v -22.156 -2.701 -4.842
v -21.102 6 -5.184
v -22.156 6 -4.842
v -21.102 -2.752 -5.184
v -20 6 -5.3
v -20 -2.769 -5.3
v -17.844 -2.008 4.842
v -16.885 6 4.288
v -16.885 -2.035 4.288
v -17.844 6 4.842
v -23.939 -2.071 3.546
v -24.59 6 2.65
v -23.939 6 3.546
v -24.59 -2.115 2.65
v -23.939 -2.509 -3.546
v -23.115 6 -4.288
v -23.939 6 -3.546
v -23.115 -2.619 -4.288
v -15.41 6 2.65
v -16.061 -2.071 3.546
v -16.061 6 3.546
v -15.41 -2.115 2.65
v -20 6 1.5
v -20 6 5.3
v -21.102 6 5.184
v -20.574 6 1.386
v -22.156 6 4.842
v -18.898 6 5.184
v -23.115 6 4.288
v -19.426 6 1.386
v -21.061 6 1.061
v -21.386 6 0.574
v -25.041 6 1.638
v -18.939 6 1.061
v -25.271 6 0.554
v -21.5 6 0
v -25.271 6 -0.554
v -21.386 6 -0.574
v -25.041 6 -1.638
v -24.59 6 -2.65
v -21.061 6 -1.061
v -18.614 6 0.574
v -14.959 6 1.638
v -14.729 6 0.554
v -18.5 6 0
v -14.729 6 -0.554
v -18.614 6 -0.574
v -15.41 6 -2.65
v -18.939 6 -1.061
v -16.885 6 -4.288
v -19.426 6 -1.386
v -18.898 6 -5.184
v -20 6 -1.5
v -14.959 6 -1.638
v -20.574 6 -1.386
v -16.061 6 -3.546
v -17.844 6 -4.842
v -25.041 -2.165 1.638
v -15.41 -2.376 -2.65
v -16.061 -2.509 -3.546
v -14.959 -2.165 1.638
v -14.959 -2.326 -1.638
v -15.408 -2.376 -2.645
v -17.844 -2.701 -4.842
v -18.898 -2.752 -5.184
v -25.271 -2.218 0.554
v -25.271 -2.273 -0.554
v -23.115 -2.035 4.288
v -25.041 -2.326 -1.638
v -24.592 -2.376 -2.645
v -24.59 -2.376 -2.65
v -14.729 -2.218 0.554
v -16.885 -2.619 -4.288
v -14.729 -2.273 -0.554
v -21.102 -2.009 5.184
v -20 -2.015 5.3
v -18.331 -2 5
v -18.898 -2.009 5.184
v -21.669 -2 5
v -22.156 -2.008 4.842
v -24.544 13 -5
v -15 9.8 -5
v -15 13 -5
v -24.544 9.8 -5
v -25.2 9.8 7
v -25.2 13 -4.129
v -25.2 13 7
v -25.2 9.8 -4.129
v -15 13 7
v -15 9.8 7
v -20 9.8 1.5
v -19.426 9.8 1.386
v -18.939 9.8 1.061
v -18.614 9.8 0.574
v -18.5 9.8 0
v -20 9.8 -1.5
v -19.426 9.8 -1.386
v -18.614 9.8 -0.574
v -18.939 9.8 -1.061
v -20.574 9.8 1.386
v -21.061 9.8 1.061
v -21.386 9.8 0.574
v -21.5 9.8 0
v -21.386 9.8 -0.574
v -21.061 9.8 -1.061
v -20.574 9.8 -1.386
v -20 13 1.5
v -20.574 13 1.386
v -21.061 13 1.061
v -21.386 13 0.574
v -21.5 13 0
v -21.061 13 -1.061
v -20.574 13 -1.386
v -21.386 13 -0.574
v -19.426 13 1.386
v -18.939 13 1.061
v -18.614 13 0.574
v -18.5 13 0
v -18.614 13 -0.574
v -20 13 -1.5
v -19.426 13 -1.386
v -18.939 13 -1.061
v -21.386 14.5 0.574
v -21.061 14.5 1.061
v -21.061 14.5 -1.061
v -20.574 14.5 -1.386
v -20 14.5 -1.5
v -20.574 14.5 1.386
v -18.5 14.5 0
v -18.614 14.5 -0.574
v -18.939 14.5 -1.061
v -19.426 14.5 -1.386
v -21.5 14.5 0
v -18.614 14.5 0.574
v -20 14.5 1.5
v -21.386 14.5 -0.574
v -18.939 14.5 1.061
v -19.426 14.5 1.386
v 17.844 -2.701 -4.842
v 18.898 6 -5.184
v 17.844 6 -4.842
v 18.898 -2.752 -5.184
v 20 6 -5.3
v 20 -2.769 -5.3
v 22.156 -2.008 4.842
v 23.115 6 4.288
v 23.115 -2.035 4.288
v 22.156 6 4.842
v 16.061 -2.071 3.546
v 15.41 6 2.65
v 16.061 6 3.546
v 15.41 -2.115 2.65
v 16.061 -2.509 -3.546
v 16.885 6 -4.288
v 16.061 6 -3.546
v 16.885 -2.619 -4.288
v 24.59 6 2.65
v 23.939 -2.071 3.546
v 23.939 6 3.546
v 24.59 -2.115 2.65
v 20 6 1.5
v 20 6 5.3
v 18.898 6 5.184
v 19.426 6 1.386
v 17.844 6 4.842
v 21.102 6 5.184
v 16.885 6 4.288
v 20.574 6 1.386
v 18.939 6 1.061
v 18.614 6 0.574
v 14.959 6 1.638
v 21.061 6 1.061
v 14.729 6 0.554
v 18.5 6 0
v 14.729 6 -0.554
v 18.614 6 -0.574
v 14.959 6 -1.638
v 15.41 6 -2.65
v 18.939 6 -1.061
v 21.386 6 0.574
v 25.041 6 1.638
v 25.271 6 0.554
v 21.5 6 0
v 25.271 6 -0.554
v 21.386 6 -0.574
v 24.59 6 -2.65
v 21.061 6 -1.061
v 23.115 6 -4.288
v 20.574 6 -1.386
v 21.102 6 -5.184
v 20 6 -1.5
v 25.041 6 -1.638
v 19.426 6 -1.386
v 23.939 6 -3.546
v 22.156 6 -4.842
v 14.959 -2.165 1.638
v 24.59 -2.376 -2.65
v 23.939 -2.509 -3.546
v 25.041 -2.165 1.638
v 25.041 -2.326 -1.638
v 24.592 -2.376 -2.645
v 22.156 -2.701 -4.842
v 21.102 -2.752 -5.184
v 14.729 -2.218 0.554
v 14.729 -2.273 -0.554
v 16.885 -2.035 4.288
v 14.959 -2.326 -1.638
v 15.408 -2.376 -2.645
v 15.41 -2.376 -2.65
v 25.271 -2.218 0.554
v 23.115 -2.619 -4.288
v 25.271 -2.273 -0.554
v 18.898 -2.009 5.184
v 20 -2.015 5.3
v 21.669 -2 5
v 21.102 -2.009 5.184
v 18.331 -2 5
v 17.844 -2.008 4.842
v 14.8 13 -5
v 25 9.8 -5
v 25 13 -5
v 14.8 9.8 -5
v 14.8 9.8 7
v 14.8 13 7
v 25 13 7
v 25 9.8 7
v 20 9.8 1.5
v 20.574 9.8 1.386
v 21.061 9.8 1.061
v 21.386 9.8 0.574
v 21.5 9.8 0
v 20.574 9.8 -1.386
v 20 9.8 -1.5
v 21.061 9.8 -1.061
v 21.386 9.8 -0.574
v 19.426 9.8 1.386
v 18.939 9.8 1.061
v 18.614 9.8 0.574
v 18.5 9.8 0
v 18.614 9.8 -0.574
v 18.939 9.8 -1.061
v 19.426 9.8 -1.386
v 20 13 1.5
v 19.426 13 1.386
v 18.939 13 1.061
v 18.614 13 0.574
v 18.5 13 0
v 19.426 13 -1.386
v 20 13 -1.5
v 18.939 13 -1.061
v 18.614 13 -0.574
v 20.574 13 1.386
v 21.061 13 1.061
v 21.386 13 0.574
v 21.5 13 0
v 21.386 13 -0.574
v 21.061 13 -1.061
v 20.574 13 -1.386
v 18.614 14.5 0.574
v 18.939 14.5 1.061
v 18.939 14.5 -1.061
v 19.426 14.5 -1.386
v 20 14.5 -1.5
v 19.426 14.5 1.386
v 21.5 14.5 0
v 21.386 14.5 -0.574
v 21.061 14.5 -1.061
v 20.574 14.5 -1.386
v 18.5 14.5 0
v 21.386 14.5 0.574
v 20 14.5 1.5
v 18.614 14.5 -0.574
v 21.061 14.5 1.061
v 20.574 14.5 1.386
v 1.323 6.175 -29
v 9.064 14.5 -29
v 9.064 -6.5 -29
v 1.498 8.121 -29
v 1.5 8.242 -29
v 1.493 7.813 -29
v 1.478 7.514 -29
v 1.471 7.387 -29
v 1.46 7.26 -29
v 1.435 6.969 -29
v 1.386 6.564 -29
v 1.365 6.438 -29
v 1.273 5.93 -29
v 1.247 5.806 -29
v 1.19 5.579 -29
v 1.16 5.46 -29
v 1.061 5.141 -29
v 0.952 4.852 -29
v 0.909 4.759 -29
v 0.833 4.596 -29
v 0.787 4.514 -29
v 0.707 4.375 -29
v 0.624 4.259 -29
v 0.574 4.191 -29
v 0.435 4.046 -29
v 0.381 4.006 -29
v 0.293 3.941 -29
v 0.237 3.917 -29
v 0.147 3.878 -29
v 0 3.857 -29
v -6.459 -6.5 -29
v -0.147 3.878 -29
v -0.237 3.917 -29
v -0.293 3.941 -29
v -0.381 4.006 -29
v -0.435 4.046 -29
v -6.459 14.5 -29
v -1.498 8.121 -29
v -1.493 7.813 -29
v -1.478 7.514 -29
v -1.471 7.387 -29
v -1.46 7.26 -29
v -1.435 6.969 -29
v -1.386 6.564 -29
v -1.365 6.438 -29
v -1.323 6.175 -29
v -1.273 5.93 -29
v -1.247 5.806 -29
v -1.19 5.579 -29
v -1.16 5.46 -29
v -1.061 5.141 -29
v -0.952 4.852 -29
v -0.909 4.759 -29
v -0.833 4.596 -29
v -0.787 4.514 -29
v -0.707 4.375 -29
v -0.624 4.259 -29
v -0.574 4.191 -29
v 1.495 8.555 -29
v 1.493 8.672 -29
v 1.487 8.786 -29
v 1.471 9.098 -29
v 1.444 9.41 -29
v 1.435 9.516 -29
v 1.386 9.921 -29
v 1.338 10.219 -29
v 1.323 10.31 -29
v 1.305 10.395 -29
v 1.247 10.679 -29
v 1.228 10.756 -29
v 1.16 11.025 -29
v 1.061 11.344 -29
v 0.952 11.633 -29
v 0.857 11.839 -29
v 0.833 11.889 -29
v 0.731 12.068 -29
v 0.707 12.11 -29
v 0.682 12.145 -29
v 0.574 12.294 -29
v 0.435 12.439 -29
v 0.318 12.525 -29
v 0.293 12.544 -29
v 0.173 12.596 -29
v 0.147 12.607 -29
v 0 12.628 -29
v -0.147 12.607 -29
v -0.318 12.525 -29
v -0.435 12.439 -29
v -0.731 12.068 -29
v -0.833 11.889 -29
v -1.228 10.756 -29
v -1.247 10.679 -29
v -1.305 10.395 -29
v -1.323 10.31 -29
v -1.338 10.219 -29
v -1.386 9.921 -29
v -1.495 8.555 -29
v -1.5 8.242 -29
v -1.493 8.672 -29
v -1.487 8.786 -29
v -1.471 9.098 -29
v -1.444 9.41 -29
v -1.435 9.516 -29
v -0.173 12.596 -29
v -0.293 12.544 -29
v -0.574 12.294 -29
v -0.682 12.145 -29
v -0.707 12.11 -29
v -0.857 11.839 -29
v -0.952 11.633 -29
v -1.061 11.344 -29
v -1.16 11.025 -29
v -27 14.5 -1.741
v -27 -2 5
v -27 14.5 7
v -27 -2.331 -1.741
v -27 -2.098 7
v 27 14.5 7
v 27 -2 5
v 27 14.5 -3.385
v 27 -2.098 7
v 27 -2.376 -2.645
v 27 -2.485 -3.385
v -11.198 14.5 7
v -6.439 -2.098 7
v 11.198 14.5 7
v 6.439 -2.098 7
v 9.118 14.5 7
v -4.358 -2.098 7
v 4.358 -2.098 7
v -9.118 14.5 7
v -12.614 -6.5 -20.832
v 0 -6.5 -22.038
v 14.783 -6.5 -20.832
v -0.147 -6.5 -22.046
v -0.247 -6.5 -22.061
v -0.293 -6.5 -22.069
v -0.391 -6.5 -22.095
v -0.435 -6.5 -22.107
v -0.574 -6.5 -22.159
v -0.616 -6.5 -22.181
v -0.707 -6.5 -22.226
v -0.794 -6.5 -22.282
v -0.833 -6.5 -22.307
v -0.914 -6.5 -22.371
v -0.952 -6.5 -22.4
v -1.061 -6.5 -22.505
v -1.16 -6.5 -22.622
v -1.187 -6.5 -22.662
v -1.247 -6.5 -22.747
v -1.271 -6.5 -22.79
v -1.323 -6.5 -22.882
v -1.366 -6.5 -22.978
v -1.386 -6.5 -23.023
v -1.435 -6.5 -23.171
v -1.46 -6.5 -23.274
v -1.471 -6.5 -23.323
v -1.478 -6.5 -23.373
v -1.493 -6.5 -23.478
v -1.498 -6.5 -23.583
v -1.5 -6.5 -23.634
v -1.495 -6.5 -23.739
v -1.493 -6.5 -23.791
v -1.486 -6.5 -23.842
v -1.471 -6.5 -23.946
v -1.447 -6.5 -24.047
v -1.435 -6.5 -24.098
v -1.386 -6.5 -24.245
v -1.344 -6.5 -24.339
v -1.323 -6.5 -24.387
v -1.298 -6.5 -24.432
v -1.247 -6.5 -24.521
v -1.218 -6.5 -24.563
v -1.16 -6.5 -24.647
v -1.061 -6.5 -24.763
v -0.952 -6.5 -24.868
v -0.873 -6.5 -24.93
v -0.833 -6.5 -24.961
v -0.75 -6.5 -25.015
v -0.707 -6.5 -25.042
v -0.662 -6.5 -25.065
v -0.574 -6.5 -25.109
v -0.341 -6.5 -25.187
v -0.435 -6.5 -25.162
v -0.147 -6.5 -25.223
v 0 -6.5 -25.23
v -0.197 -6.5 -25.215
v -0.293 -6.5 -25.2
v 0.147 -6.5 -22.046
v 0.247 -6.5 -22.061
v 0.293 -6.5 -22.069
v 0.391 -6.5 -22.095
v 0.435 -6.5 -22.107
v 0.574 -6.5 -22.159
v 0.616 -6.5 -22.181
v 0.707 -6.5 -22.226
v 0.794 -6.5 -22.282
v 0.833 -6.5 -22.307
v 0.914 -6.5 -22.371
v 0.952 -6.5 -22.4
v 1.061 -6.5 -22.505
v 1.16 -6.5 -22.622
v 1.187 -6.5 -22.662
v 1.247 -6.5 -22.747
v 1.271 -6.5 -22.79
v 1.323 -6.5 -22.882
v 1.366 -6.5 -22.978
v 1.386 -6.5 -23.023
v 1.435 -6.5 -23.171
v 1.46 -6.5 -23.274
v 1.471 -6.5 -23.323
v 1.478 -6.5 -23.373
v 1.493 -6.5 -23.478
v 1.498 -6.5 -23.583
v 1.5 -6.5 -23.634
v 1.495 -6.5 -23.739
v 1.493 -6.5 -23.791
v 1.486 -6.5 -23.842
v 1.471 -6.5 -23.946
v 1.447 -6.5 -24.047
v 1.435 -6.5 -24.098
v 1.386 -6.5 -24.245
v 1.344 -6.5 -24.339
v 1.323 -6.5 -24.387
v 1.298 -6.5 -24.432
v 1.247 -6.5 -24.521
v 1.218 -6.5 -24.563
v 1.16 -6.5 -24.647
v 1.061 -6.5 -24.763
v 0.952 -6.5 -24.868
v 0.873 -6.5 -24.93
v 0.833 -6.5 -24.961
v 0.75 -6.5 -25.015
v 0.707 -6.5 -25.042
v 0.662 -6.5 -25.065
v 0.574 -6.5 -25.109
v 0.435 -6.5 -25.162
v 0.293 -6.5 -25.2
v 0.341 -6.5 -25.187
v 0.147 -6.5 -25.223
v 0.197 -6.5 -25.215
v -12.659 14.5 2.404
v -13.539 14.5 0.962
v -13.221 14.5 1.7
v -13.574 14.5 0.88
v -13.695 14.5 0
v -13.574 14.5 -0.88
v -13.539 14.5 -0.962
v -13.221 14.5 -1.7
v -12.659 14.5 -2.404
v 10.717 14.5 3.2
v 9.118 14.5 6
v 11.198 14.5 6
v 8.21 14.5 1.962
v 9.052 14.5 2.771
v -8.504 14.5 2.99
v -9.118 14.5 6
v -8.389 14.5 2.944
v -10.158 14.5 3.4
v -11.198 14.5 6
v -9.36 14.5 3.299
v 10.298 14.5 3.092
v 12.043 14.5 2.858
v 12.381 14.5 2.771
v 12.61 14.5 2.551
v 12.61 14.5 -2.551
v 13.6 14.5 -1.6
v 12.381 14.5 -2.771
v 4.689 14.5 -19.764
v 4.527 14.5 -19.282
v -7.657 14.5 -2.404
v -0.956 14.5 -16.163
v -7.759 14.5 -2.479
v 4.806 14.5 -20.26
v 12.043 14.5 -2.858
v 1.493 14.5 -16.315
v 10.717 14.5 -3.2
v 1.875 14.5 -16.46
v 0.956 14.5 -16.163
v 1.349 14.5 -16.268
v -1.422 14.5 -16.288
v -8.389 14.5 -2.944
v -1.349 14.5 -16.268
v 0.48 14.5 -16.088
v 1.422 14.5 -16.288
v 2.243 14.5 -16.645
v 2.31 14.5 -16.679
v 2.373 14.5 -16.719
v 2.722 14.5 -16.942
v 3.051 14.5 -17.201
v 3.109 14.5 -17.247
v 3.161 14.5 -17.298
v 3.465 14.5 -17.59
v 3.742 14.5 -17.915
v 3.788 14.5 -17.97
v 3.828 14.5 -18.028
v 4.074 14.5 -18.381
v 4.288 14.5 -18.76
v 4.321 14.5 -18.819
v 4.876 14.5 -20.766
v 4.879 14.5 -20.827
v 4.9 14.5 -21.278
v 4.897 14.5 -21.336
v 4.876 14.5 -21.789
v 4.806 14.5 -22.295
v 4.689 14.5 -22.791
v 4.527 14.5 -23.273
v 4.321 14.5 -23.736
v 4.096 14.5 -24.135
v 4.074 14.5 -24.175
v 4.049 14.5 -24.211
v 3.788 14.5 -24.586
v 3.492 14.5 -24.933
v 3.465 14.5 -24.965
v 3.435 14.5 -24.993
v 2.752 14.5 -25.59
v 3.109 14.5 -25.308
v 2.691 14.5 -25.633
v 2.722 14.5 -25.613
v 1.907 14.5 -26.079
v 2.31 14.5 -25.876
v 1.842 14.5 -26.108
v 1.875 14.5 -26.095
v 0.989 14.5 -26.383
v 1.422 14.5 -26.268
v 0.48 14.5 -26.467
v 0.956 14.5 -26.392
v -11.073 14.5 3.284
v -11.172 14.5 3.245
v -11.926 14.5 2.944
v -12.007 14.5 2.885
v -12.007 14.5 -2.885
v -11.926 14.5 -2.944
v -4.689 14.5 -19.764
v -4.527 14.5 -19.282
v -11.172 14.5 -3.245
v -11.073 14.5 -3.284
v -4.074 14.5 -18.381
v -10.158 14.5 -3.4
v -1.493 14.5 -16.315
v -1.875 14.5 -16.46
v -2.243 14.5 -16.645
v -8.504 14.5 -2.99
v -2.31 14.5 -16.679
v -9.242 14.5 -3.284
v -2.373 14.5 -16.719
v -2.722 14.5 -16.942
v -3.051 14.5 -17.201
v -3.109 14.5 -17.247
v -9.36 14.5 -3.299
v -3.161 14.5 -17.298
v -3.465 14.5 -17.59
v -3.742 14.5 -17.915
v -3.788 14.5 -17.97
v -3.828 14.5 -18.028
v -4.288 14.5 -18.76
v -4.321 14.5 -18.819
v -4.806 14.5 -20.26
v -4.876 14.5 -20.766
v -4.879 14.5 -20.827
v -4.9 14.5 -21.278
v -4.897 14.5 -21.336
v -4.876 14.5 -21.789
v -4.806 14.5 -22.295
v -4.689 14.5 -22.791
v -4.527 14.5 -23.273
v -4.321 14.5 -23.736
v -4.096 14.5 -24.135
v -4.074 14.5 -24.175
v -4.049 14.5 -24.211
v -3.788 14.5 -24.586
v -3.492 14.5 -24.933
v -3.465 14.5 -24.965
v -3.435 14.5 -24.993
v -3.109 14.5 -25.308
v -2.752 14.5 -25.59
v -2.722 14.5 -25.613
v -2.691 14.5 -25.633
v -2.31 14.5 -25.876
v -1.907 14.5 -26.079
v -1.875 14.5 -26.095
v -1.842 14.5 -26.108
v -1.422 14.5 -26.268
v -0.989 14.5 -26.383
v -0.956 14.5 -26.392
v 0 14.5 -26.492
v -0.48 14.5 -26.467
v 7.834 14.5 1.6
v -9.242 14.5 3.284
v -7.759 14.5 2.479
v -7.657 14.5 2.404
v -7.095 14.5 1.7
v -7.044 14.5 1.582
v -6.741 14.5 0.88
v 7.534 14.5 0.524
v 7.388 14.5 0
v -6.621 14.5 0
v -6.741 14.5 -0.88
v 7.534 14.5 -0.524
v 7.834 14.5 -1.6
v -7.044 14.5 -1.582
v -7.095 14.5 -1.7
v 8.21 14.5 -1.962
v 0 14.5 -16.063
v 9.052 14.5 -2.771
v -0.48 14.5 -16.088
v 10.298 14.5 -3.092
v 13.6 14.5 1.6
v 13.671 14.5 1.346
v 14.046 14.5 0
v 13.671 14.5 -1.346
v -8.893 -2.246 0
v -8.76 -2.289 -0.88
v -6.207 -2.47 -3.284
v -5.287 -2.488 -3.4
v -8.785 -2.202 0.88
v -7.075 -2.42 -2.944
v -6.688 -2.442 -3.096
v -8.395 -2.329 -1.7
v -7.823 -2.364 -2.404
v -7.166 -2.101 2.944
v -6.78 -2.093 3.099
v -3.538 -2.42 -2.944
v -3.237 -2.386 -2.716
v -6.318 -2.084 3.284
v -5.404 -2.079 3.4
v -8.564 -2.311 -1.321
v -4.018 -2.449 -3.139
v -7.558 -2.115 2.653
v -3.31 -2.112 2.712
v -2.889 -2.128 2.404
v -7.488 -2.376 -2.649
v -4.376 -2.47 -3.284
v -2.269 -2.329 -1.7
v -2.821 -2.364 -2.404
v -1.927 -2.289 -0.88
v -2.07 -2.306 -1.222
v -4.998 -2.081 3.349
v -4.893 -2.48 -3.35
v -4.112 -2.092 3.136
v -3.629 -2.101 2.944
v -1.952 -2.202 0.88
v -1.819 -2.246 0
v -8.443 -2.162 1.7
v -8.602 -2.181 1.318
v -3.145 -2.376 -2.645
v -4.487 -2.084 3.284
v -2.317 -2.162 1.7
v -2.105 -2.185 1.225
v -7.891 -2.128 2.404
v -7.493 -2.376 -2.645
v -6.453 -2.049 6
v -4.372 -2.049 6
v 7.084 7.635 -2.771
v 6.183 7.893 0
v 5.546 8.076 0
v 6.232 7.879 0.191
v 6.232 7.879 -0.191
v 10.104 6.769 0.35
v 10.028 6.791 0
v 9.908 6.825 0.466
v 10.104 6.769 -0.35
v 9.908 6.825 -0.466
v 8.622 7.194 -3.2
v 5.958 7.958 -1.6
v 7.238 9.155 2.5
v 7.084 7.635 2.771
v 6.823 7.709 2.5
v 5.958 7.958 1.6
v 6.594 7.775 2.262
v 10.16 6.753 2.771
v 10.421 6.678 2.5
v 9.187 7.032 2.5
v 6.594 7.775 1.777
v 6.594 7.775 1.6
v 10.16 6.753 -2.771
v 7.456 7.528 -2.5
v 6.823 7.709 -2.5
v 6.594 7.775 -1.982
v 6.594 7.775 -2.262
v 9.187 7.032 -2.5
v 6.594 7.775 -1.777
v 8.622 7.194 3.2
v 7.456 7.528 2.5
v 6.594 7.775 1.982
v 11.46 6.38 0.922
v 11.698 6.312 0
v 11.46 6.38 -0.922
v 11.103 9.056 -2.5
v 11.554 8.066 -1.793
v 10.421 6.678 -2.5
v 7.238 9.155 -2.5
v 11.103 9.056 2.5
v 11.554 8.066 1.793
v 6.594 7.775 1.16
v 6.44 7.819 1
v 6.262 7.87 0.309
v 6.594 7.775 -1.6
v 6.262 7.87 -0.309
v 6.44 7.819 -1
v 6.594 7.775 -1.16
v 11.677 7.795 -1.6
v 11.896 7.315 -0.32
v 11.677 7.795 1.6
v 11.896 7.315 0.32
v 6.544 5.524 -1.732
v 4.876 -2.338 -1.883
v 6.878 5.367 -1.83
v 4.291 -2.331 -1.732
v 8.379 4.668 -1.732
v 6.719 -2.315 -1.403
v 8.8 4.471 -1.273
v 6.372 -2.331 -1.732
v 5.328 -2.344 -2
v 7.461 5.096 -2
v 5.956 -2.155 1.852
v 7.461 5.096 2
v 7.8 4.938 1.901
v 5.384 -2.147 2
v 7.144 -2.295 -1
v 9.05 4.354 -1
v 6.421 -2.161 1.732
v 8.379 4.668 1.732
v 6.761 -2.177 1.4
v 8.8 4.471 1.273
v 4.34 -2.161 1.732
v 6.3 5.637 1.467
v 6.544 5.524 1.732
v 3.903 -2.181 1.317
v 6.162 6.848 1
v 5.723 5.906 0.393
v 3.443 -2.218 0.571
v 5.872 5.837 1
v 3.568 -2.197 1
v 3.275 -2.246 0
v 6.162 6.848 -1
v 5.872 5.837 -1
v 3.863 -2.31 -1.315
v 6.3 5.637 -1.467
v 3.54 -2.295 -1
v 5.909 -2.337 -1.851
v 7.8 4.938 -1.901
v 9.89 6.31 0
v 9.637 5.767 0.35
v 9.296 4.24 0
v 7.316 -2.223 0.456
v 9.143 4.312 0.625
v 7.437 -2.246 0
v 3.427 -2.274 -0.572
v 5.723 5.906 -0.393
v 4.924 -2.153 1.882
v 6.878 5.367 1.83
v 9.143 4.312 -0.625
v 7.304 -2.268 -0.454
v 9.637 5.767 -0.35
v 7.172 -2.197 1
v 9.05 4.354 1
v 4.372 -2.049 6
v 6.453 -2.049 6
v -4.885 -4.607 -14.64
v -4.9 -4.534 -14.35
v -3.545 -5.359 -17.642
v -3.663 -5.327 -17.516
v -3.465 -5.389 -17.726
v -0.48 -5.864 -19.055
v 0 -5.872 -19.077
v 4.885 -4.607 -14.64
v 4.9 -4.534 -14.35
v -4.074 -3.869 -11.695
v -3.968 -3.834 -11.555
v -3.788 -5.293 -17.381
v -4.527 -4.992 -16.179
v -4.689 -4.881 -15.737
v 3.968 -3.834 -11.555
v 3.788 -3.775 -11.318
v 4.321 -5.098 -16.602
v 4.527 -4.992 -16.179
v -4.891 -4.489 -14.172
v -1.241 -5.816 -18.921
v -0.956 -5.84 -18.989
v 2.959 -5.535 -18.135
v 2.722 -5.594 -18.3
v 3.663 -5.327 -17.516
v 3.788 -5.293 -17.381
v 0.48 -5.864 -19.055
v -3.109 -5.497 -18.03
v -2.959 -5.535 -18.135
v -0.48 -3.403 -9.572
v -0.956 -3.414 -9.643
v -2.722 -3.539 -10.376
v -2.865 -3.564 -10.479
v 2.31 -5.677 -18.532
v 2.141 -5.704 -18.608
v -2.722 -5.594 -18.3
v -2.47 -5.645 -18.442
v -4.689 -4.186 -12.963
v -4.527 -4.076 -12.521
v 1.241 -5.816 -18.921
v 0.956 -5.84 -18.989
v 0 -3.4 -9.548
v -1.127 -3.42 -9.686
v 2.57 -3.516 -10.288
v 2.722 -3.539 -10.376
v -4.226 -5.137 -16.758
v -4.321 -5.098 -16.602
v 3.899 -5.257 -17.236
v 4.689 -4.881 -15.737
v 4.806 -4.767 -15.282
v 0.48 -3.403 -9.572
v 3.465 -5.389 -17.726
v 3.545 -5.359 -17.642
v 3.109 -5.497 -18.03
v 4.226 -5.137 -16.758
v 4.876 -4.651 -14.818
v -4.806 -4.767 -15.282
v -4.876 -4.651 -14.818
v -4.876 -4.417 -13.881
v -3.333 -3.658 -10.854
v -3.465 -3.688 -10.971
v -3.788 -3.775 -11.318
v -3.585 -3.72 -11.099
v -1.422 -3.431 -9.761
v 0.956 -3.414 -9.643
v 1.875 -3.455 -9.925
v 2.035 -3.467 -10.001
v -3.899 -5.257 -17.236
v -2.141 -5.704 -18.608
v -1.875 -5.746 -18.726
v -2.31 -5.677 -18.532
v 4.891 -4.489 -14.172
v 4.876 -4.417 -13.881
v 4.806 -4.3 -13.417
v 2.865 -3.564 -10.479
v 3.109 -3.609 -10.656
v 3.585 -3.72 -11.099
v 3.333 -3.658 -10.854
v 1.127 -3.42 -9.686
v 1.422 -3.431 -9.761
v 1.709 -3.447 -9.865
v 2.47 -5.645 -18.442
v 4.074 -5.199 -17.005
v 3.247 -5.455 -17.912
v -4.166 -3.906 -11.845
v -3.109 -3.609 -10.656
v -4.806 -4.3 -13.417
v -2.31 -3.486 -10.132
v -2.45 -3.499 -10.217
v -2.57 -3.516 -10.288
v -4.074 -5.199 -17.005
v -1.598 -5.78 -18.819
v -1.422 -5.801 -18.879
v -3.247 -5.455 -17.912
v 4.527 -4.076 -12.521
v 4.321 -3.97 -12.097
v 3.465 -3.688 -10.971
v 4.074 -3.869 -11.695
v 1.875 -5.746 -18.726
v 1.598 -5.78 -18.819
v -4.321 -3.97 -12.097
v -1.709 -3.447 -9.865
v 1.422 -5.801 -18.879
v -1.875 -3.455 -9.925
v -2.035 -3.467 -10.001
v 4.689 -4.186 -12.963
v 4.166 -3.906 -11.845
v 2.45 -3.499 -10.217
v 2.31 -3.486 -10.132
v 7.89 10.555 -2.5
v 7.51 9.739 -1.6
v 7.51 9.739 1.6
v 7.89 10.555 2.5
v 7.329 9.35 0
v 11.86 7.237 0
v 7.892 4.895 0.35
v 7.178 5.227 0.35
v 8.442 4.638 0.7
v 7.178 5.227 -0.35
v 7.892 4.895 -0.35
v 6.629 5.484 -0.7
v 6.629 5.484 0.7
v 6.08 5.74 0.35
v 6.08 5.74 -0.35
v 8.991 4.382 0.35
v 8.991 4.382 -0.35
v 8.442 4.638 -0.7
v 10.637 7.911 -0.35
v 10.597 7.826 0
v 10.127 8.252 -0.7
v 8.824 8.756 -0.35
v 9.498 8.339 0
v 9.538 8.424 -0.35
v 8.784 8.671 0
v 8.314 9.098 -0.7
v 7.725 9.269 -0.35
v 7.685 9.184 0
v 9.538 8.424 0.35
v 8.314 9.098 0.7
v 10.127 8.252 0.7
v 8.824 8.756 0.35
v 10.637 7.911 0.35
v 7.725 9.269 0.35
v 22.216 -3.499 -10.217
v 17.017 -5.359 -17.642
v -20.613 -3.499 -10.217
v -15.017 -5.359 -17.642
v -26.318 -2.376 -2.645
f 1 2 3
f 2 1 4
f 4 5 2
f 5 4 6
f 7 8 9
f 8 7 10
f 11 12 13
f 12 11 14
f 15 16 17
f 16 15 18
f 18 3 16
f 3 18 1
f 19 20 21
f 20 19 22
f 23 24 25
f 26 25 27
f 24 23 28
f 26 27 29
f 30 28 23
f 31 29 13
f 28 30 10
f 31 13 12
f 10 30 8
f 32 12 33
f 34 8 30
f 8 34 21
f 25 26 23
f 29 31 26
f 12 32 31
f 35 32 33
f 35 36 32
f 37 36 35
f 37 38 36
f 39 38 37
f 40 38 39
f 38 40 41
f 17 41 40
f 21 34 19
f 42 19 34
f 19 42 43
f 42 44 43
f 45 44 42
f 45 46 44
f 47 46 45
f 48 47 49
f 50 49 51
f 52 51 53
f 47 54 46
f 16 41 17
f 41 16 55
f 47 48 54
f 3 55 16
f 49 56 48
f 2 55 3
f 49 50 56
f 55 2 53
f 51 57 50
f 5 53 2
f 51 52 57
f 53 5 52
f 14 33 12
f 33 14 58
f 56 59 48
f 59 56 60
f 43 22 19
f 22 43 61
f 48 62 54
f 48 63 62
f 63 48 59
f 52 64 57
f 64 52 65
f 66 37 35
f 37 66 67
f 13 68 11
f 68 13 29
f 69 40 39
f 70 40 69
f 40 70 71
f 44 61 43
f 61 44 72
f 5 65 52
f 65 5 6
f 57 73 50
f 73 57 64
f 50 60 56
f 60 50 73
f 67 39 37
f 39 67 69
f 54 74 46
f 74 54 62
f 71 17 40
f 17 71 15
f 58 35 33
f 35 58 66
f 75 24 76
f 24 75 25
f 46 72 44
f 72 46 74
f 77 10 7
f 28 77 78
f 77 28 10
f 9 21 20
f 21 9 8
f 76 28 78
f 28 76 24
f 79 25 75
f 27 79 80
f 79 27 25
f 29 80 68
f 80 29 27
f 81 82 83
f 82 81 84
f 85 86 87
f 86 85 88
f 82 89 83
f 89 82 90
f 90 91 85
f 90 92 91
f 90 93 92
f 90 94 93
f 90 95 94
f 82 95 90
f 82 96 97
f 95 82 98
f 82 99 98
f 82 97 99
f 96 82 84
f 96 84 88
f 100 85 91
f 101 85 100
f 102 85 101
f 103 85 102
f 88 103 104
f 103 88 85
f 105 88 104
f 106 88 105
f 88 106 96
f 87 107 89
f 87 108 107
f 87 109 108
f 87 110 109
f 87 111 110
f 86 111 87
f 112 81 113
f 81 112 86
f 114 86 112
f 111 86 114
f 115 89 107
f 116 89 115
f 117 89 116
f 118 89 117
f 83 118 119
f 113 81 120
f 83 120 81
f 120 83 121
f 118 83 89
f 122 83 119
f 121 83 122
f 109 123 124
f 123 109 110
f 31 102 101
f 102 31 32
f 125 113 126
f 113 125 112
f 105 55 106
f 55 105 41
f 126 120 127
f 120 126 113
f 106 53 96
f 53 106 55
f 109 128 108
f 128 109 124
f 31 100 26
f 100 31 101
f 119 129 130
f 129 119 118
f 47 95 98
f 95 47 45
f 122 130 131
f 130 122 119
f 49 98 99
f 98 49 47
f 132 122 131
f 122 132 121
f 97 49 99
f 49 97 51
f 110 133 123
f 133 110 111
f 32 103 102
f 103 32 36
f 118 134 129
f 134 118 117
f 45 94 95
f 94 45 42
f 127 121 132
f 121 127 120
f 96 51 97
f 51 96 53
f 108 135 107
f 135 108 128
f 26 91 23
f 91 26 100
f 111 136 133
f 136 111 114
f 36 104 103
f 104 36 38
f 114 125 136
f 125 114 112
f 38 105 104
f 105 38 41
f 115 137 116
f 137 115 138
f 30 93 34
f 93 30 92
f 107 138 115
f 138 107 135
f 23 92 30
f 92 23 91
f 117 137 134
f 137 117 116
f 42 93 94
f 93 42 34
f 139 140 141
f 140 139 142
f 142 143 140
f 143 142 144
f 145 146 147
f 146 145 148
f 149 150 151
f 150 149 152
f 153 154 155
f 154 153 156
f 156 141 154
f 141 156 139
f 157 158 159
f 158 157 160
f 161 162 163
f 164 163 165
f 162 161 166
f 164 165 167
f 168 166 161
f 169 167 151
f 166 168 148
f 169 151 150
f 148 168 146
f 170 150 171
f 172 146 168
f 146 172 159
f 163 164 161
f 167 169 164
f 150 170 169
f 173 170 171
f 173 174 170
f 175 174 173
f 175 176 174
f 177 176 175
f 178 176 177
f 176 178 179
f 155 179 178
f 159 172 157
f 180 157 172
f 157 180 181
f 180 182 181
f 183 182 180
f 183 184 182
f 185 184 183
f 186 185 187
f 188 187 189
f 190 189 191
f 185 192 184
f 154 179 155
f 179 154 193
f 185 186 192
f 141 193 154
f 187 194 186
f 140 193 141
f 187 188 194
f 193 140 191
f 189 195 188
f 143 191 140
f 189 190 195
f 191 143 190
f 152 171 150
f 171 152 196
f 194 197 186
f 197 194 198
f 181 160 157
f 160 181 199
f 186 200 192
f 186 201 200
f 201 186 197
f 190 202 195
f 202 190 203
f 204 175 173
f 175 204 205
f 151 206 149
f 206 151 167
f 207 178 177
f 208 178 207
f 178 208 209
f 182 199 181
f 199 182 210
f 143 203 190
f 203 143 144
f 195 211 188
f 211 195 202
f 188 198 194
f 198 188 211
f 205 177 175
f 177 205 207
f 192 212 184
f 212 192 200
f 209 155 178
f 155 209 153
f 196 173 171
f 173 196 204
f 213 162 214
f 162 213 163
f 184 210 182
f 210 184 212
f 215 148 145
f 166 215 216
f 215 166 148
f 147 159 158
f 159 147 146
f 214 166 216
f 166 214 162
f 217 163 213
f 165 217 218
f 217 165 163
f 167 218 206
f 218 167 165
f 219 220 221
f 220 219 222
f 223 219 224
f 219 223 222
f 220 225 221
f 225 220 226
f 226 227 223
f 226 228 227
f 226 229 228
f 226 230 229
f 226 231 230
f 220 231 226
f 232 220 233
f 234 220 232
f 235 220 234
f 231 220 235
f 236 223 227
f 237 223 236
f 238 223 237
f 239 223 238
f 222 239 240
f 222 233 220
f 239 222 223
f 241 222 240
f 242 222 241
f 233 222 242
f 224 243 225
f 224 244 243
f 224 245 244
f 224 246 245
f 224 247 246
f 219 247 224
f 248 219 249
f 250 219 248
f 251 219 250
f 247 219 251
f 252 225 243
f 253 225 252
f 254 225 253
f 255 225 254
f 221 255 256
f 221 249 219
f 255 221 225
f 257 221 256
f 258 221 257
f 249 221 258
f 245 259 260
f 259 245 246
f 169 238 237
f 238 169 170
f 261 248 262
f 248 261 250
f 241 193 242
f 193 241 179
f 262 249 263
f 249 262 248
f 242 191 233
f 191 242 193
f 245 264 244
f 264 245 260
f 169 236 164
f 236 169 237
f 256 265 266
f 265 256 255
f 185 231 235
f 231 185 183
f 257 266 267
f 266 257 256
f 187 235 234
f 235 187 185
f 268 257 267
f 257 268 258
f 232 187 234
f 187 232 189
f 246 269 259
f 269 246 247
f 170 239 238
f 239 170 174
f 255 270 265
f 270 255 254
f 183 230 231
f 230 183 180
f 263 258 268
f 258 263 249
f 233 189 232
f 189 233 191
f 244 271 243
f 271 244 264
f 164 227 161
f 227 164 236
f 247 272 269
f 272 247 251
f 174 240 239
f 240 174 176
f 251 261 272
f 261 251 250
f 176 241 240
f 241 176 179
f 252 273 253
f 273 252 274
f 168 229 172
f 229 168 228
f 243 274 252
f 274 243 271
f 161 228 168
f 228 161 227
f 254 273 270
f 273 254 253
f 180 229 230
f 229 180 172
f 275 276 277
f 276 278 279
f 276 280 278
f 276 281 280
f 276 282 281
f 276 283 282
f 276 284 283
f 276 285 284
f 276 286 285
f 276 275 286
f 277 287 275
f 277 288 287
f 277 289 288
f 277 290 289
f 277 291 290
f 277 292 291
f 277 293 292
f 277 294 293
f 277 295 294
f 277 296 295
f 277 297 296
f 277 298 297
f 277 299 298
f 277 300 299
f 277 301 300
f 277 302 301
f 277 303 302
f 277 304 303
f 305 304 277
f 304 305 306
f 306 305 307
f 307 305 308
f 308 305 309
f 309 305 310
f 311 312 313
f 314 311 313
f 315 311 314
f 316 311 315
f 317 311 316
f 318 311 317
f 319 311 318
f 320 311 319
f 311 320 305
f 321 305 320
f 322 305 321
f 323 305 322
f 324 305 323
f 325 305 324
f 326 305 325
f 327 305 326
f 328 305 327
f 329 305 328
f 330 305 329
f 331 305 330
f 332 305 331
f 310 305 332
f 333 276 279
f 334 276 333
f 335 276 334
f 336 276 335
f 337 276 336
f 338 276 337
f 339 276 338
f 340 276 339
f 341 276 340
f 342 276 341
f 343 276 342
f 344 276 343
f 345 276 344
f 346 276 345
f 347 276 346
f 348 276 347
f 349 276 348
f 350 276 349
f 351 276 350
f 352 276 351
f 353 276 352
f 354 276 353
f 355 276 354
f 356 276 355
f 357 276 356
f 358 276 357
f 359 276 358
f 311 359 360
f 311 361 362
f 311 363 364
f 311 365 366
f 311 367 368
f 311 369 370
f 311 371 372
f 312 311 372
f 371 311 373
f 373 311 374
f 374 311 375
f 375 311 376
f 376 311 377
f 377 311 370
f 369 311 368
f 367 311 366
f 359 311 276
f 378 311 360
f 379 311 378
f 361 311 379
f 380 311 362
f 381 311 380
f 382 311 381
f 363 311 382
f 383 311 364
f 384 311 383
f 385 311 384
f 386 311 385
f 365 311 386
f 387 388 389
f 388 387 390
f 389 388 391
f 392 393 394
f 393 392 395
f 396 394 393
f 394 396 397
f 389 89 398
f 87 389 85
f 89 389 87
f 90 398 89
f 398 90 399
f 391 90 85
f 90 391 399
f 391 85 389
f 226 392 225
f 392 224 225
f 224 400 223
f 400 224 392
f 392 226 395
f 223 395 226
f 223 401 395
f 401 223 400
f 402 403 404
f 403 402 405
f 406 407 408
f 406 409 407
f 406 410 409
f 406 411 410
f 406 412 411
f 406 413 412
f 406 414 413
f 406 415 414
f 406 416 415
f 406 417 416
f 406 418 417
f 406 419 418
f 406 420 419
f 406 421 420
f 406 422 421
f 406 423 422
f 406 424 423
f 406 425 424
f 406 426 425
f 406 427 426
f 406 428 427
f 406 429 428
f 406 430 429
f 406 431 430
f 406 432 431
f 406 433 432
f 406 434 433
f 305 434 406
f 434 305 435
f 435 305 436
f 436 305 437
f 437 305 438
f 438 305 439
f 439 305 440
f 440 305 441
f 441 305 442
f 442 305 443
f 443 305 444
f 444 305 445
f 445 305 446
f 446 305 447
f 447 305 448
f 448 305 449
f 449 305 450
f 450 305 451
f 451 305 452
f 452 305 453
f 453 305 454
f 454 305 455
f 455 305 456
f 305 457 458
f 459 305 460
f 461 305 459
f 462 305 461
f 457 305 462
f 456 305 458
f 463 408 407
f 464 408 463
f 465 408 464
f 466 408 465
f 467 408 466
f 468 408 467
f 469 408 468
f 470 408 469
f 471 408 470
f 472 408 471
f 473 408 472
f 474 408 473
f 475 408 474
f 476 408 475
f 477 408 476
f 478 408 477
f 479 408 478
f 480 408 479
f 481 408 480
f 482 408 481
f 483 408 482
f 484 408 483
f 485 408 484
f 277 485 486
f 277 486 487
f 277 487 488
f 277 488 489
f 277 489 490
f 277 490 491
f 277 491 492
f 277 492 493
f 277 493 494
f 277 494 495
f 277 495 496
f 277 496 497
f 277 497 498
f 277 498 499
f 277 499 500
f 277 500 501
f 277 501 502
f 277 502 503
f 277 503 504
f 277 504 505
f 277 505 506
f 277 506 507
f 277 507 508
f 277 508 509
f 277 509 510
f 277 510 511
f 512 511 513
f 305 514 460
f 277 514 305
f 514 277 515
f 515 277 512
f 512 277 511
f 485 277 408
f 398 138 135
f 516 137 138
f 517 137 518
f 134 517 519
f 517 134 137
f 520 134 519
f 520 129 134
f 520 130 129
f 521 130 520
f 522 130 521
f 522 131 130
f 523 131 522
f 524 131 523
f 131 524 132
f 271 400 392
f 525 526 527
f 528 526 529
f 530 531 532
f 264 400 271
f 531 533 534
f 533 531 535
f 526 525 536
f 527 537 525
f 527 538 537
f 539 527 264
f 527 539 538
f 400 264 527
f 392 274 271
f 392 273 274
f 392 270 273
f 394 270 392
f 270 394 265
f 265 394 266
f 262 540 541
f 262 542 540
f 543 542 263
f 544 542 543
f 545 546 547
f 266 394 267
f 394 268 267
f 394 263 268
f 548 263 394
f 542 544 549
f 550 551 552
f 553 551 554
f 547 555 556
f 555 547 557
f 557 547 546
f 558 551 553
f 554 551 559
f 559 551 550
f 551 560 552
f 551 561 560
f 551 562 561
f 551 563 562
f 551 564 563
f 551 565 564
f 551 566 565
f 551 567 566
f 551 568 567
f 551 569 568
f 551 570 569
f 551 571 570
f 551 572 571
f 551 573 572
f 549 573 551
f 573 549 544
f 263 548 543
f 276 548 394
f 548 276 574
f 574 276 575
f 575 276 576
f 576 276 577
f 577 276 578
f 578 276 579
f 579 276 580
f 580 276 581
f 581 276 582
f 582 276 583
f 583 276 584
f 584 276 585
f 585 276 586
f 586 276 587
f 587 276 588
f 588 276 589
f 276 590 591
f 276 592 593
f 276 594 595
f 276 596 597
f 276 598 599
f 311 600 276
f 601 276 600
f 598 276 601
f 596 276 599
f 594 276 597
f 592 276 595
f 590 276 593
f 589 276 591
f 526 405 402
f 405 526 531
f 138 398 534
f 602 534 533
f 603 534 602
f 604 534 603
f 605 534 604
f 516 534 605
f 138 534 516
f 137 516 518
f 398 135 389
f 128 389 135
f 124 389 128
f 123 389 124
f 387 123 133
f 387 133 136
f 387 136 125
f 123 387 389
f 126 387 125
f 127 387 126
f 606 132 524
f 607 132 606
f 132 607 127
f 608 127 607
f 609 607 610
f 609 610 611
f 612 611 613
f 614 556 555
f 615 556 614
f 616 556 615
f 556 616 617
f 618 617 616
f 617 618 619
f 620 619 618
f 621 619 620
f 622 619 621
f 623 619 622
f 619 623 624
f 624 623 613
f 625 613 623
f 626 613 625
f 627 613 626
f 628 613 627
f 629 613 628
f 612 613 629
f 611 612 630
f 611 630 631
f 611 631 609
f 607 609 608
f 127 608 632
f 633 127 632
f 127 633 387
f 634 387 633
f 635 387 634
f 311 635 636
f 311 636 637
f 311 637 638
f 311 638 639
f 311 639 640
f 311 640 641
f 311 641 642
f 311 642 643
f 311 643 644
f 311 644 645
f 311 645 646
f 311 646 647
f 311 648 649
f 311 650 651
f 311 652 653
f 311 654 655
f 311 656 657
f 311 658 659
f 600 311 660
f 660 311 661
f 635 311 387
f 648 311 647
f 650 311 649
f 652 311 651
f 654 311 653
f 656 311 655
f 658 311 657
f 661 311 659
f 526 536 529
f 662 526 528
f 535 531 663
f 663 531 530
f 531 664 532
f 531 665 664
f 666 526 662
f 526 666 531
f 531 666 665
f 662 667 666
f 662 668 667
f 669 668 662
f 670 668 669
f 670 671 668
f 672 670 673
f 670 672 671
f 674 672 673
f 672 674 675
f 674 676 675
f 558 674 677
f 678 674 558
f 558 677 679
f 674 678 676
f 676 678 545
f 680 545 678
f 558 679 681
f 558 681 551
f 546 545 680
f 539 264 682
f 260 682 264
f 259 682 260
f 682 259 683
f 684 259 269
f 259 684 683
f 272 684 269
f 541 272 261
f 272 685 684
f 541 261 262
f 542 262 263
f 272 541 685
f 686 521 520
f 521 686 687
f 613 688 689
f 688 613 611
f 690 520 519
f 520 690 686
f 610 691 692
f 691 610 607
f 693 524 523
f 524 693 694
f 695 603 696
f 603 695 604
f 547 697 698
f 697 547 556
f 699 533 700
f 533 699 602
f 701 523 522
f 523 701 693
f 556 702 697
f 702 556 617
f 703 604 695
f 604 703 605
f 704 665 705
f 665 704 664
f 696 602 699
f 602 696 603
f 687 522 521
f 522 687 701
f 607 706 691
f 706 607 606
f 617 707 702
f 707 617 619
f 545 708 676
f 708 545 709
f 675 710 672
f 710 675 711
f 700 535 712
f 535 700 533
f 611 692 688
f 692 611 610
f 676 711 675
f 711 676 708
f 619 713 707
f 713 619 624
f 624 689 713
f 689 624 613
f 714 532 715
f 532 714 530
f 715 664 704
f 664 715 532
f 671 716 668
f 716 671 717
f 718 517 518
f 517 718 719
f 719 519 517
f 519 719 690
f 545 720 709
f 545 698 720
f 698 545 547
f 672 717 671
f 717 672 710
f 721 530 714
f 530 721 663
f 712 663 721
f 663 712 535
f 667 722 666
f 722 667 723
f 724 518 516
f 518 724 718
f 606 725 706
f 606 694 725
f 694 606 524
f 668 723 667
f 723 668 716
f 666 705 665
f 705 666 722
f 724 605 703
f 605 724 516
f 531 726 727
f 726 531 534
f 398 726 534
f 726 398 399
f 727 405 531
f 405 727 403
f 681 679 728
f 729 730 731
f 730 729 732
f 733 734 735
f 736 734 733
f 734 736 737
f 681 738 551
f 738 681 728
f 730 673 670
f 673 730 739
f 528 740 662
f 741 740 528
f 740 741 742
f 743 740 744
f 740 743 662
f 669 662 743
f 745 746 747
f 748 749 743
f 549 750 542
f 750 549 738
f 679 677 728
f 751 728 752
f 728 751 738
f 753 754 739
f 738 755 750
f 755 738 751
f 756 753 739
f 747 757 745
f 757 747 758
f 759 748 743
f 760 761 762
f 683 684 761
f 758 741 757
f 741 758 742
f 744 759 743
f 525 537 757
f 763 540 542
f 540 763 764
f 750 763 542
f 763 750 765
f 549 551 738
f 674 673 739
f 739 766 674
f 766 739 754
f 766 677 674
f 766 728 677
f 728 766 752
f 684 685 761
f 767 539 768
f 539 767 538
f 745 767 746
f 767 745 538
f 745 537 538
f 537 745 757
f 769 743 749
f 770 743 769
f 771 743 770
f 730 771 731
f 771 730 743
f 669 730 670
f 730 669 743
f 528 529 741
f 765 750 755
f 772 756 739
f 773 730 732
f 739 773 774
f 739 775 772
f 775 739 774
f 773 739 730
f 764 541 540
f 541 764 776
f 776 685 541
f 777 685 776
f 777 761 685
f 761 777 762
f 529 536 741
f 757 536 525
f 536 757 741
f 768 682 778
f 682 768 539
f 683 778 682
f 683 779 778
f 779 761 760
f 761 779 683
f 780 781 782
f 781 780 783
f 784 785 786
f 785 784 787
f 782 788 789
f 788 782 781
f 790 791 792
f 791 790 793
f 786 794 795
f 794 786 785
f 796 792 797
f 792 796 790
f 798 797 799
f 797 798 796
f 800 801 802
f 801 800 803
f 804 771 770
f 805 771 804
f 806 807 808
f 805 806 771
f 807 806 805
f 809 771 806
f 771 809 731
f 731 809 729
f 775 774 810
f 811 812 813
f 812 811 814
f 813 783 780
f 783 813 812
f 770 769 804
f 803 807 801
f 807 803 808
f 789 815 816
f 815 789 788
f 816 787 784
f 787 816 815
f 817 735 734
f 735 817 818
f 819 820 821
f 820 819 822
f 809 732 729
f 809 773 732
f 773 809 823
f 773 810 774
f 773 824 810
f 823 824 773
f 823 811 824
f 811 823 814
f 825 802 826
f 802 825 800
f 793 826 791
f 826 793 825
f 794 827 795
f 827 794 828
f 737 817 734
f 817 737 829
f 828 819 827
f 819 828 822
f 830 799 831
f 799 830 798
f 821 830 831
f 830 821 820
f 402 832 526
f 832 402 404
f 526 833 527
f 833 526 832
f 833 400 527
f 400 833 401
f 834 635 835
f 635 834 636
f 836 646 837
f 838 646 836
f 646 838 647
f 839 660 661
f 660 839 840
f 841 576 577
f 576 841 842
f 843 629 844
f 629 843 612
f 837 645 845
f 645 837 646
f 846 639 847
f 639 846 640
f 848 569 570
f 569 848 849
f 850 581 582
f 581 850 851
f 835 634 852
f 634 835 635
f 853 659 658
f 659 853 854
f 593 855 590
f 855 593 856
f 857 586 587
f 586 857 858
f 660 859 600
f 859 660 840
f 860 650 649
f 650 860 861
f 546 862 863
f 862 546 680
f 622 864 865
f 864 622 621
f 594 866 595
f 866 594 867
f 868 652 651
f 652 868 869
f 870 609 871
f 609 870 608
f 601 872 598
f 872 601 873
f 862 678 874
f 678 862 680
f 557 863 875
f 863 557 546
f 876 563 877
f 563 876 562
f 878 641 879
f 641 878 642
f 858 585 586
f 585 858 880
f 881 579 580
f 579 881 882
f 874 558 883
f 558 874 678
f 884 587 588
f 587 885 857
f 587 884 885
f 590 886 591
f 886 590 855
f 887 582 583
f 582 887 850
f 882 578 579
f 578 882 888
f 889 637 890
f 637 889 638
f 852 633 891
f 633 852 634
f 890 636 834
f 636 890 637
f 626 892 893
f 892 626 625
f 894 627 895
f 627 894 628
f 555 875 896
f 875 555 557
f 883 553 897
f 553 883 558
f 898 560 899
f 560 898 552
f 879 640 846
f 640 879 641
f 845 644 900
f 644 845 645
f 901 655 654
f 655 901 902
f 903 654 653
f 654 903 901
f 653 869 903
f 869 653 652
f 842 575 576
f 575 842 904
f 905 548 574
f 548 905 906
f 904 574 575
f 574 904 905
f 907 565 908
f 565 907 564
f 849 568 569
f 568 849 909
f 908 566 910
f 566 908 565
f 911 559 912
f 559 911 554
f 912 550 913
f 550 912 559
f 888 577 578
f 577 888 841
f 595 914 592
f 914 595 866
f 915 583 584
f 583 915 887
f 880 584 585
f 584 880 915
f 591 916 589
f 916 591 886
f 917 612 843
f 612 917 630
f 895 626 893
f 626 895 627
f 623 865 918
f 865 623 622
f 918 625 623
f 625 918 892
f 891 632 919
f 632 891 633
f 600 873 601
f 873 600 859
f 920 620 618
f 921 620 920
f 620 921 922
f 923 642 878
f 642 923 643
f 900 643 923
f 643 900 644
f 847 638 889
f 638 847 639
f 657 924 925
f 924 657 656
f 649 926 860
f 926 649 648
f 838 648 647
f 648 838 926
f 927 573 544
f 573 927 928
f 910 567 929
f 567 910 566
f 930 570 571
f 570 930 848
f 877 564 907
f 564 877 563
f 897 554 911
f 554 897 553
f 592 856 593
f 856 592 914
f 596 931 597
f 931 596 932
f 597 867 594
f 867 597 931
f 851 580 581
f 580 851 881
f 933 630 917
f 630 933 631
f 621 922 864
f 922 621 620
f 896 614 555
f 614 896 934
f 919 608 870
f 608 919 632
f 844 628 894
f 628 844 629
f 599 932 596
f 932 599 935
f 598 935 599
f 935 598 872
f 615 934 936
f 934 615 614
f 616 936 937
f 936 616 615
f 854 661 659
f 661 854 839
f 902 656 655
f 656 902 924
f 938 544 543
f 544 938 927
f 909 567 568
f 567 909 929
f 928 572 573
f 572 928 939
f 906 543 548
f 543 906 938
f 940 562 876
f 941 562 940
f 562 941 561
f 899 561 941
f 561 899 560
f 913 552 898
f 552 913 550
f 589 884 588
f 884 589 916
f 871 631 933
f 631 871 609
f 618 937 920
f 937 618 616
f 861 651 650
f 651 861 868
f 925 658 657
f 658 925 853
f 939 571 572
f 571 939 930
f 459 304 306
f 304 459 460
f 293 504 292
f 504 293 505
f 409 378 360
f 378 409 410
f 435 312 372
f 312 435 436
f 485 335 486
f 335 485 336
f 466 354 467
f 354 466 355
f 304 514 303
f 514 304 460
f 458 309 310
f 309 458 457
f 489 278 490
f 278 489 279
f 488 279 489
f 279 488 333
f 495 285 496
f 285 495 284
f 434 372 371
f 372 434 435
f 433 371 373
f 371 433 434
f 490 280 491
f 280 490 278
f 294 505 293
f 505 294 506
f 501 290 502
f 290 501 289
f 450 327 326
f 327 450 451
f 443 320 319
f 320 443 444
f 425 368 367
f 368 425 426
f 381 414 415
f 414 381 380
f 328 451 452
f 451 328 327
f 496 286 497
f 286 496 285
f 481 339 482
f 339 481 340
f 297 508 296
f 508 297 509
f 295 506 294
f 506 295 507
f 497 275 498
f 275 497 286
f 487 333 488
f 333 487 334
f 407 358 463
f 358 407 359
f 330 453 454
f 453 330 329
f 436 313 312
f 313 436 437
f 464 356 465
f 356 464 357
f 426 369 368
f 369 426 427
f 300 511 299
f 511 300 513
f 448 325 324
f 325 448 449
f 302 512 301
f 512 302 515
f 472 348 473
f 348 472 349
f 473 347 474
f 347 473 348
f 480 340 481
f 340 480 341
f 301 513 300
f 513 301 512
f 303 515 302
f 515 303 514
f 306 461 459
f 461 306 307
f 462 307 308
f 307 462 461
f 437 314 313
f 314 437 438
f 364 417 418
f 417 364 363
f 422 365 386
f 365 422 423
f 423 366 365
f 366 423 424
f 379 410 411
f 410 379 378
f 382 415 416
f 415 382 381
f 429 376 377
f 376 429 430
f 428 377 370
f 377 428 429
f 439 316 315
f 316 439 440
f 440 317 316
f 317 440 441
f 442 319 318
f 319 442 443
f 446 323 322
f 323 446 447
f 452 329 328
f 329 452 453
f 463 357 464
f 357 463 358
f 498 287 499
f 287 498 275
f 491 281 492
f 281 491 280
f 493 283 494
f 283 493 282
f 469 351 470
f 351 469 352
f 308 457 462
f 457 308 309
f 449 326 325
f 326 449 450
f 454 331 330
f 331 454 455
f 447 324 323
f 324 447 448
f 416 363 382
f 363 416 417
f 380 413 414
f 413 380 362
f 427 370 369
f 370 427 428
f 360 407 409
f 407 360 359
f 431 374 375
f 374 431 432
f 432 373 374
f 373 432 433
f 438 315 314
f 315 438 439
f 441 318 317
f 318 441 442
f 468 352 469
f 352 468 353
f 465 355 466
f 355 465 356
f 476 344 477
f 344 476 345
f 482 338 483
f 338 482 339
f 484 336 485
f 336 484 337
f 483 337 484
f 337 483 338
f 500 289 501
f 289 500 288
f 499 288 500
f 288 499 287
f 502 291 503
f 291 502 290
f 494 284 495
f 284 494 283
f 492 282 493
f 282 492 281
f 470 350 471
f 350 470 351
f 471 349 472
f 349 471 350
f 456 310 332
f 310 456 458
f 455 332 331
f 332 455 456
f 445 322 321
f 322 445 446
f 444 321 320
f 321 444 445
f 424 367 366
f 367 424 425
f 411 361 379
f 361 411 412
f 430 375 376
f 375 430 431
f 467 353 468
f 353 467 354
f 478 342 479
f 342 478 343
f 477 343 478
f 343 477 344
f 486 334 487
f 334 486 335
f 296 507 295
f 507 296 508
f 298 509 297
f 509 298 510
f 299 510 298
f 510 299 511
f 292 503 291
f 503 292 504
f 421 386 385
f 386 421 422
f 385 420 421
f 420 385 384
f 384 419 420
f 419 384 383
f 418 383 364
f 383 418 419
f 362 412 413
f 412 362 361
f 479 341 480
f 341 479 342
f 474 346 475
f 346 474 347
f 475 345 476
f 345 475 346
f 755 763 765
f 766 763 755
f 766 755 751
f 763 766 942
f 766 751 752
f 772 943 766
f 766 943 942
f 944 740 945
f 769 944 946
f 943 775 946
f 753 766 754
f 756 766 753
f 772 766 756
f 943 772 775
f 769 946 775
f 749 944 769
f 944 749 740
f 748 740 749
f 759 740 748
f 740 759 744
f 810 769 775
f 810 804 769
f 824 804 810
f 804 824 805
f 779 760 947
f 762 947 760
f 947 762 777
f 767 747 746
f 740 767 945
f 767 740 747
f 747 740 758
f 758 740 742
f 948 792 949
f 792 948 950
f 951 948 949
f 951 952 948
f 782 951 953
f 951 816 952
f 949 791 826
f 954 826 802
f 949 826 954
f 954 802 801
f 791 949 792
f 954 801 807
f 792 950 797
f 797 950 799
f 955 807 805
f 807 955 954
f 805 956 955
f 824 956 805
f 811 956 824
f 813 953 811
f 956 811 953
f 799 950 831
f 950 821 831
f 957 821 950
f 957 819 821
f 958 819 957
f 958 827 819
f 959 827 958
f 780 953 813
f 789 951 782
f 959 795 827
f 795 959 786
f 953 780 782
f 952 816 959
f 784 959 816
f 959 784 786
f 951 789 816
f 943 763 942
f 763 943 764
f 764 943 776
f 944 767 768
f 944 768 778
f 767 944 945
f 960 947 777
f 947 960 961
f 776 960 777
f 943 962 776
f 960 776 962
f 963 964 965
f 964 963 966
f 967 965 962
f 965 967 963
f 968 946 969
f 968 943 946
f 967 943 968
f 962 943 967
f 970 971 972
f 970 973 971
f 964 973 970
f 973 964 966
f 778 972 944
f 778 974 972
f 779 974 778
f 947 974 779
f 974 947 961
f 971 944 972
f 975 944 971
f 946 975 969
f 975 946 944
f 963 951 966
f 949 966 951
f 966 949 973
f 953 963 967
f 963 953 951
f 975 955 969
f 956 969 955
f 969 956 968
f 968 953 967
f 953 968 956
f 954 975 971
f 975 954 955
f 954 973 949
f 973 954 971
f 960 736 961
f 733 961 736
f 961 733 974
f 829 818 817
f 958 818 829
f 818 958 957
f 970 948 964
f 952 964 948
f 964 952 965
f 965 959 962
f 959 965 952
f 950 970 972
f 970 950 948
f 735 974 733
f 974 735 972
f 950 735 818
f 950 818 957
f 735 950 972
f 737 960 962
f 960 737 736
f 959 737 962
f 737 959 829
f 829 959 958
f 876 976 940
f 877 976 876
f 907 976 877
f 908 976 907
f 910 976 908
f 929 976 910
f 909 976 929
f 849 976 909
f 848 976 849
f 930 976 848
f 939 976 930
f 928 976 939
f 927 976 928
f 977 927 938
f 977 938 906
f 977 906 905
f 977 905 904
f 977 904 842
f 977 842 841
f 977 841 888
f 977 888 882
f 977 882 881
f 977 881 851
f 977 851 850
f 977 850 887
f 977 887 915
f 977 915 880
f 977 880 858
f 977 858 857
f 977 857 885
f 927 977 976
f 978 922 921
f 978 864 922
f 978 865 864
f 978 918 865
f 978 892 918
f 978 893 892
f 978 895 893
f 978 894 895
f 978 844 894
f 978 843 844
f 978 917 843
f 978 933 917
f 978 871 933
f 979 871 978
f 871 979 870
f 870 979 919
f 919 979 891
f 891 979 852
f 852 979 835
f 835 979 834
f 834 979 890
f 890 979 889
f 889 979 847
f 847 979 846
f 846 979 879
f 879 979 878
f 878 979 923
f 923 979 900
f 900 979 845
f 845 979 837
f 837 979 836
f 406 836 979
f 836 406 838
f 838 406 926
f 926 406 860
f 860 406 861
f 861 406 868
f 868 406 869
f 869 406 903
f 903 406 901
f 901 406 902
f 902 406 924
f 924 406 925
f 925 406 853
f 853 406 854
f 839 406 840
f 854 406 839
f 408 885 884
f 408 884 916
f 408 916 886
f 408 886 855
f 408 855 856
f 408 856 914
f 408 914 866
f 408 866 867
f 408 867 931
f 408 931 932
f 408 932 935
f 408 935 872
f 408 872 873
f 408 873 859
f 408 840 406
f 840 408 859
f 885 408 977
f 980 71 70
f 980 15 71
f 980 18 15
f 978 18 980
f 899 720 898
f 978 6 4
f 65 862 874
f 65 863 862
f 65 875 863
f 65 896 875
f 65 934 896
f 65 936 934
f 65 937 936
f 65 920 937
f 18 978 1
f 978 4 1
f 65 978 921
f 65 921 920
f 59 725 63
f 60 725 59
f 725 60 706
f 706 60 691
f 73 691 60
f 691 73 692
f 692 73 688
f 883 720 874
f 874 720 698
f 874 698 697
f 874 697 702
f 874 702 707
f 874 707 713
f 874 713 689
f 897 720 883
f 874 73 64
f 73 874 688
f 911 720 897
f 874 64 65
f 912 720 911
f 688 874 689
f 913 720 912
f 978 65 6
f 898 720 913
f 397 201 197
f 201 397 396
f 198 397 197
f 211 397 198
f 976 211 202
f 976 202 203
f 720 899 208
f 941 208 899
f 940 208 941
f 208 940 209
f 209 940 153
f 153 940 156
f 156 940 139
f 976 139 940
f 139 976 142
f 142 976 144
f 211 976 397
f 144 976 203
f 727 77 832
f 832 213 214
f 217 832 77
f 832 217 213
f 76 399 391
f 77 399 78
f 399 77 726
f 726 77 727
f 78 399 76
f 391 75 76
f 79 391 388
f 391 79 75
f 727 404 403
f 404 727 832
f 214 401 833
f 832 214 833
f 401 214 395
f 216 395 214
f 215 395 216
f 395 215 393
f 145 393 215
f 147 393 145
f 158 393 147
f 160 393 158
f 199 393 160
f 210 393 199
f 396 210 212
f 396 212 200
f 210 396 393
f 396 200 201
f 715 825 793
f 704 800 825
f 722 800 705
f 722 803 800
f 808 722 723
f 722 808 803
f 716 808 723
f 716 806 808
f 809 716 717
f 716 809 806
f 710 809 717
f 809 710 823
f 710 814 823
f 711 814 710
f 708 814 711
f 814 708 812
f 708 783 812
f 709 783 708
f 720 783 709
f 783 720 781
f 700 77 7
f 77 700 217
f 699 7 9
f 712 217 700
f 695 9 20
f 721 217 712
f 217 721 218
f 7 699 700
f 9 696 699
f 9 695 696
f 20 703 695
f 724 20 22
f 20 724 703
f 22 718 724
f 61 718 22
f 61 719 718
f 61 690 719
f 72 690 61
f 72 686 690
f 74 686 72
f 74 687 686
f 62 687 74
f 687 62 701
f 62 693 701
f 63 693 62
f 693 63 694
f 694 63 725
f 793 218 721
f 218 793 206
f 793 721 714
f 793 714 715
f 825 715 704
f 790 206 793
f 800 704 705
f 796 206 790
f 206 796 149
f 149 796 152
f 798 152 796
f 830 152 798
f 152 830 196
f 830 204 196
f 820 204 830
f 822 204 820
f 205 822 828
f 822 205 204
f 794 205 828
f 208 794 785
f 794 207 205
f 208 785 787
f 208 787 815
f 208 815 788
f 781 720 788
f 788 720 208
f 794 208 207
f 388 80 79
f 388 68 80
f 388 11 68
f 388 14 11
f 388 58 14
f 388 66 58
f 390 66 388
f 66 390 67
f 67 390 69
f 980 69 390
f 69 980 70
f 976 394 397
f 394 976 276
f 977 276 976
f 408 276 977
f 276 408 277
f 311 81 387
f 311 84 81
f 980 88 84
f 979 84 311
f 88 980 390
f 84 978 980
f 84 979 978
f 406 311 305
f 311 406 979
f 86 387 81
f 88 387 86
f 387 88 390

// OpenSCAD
diameter=10;
height=4;
number=3;
distance=5;
baseline=36; 


module maghole(diameter,height,number,back) {
		translate([0,height*(number-2)/2,0])
        rotate([90,0,0])
         cylinder(r=diameter/2,h=height*(2*number-1),center=true);
    if(back == 1) {
		translate([0,-height*2*(number+1)/2,0])
        rotate([90,0,0])
         cylinder(r=diameter/6,h=height*number,center=true);
    }
}

module smaghole(diameter,height,number,back) {
		translate([0,(height*(number-2)/2),0])
        rotate([90,0,0])
         cylinder(r=0.3+diameter/2,h=height*4,center=true,$fs = 0.01);

    // Square Nut Hole
   translate([-9,-13,-5]) cube([4+diameter,3.2,diameter+0.2]);  
   // Pitch SetScrew Hole
    translate([0,(height*(number-2)/2),0]) 
        rotate([90,0,0])
             cylinder(r=1.5,h=40,center=true,$fn=16);  
}

module mirror(diameter,height,number,distance,baseline) {
width=diameter+4;
depth=distance+height*number+4;
length=baseline+diameter+8;
mirrorthick = 2.7;
   difference() {
     translate([0,-height,0])
	   cube([width,  // Small dimension
            depth, // Optical path dim
		      length],center=true);
      translate([0,0,2+baseline/2])
             maghole(diameter,height,number,0);
     translate([0,0,-(2+baseline/2)])
             maghole(diameter,height,number,0);
     translate([0,depth/4,0])
          cube([width+2,depth+2,length-2*width],center=true);
    rotate([7,0,0])
     translate([0,0.6-depth/3,0.75])
          cube([width+2,mirrorthick+0.6,length-(2*diameter+4)],center=true);
     }
}

module sensor(diameter,height,number,distance,baseline) {
width=diameter+4;
depth=distance+height*number+4;
length=baseline+diameter+8;
mirrorthick = 2.6;
//extra=2*width+4;
extra=2*width+8;
laser2015=64; // Degrees
lasera=74;
phtrans2015=116;
ptransa=106;
   difference() {
//     translate([2+width/2,-height,0])
     translate([4+width/2,-height,0])
	   cube([extra,  // Small dimension
            depth, // Optical path dim
		      length],center=true);
      translate([0,0,2+baseline/2])
             smaghole(diameter,height,number,1);
     translate([0,0,-(2+baseline/2)])
             smaghole(diameter,height,number,1);
//LASER
     translate([0,0,6])
        rotate([lasera,0,0])
             cylinder(r=3.4,h=40,center=true,$fn=24);
     translate([-11,0,6])
        rotate([lasera,0,0]) cube([10,2,40],center=true);
//PhotoTransistor
     translate([0,-12,-10])
        rotate([ptransa,0,0])
             cylinder(r=3.2,h=10,center=true,$fn=12);
     translate([0,0,-6])
        rotate([ptransa,0,0])
             cylinder(r=2,h=40,center=true,$fn=12);
     translate([-11,0,-6])
        rotate([ptransa,0,0]) cube([10,2,40],center=true);
//TEMP SENSOR
     translate([2+width,0,0])
        rotate([90,0,20])
             cylinder(r=4.9,h=40,center=true,$fn=64);
//SET SCREW
     translate([12+width,0,0])
        rotate([90,0,20])
             cylinder(r=1.5,h=40,center=true,$fn=64);
     }
//Through holes for ptrans
translate([0,-5,-5.3])
rotate([25,0,0])
     difference() {
     translate([0,-4,-2.5])cube([5,6,5],center=true);
     translate([0,-8,0])
        cylinder(r=3.2,h=10,center=true,$fn=12);
     translate([0,0,-1.0])
        rotate([90,0,0])
             cylinder(r=0.7,h=40,center=true,$fn=6);
     translate([0,0,-3])
        rotate([90,0,0])
             cylinder(r=0.7,h=40,center=true,$fn=6);
     }
}

module jarwall() {
  difference() {
     cube([40,40,120],center=true);
	  translate([40,0,0])
	     cylinder(r=50,h=120,center=true,$fn=64);
	   }
}

module jar() {
	  translate([-8,110,-10])
	          cylinder(r=78,h=120,center=true,$fn=64);
}

module powerhole(dim) {
offset = dim+2;
  //  cylinder(r=dim,h=2*dim,center=true,$fn=10);
  //  translate([dim-1.6,0,0])
   //   cylinder(r=dim,h=dim,center=true,$fn=10);
    translate([dim-3,0,0]) cube([2*dim+2,2*dim-1,2*dim-1],center=true);
    translate([-offset,0,0])
      cylinder(r=1.1,h=2*dim,center=true,$fn=10);
    translate([offset+2,0,0])
      cylinder(r=1.1,h=2*dim,center=true,$fn=10);
}

module sensordevice() {
  wall = 32;
  side = 44;
  deep = 50;
  difference() { 
   sensor(diameter,height,number,distance,baseline);
   translate([3,-30,3]) jar();
  }
//  translate([-7,-(wall+30),21]) cube([wall,side+12,3]);

//     translate([-7,-(wall+30),-24])
//         cube([wall,side+12,3]);

//  difference() {
//  translate([23.5,-(wall+7),0])
//    rotate([0,90,0])
//    cube([side,deep,3],center=true);
//     translate([24,-54,12])
//			rotate([0,90,0]) 
//           powerhole(4.5);
//  }
}
module mirrordevice() {
  difference() { 
   mirror(diameter,height,number,distance,baseline);
   translate([0,-3.3,0]) rotate([0,0,-90]) jarwall();
  }
}
  // mirrordevice();

module minimum() {
 difference() {
    rotate([0,90,180]) 
           sensordevice();
   translate([34,0,-30])
     rotate([0,35,0])
      cube([42,42,42],center=true);
   translate([-32,0,-30])
     rotate([0,-37,0])
      cube([42,42,42],center=true);
  }
}
//jarwall();
minimum();



     
